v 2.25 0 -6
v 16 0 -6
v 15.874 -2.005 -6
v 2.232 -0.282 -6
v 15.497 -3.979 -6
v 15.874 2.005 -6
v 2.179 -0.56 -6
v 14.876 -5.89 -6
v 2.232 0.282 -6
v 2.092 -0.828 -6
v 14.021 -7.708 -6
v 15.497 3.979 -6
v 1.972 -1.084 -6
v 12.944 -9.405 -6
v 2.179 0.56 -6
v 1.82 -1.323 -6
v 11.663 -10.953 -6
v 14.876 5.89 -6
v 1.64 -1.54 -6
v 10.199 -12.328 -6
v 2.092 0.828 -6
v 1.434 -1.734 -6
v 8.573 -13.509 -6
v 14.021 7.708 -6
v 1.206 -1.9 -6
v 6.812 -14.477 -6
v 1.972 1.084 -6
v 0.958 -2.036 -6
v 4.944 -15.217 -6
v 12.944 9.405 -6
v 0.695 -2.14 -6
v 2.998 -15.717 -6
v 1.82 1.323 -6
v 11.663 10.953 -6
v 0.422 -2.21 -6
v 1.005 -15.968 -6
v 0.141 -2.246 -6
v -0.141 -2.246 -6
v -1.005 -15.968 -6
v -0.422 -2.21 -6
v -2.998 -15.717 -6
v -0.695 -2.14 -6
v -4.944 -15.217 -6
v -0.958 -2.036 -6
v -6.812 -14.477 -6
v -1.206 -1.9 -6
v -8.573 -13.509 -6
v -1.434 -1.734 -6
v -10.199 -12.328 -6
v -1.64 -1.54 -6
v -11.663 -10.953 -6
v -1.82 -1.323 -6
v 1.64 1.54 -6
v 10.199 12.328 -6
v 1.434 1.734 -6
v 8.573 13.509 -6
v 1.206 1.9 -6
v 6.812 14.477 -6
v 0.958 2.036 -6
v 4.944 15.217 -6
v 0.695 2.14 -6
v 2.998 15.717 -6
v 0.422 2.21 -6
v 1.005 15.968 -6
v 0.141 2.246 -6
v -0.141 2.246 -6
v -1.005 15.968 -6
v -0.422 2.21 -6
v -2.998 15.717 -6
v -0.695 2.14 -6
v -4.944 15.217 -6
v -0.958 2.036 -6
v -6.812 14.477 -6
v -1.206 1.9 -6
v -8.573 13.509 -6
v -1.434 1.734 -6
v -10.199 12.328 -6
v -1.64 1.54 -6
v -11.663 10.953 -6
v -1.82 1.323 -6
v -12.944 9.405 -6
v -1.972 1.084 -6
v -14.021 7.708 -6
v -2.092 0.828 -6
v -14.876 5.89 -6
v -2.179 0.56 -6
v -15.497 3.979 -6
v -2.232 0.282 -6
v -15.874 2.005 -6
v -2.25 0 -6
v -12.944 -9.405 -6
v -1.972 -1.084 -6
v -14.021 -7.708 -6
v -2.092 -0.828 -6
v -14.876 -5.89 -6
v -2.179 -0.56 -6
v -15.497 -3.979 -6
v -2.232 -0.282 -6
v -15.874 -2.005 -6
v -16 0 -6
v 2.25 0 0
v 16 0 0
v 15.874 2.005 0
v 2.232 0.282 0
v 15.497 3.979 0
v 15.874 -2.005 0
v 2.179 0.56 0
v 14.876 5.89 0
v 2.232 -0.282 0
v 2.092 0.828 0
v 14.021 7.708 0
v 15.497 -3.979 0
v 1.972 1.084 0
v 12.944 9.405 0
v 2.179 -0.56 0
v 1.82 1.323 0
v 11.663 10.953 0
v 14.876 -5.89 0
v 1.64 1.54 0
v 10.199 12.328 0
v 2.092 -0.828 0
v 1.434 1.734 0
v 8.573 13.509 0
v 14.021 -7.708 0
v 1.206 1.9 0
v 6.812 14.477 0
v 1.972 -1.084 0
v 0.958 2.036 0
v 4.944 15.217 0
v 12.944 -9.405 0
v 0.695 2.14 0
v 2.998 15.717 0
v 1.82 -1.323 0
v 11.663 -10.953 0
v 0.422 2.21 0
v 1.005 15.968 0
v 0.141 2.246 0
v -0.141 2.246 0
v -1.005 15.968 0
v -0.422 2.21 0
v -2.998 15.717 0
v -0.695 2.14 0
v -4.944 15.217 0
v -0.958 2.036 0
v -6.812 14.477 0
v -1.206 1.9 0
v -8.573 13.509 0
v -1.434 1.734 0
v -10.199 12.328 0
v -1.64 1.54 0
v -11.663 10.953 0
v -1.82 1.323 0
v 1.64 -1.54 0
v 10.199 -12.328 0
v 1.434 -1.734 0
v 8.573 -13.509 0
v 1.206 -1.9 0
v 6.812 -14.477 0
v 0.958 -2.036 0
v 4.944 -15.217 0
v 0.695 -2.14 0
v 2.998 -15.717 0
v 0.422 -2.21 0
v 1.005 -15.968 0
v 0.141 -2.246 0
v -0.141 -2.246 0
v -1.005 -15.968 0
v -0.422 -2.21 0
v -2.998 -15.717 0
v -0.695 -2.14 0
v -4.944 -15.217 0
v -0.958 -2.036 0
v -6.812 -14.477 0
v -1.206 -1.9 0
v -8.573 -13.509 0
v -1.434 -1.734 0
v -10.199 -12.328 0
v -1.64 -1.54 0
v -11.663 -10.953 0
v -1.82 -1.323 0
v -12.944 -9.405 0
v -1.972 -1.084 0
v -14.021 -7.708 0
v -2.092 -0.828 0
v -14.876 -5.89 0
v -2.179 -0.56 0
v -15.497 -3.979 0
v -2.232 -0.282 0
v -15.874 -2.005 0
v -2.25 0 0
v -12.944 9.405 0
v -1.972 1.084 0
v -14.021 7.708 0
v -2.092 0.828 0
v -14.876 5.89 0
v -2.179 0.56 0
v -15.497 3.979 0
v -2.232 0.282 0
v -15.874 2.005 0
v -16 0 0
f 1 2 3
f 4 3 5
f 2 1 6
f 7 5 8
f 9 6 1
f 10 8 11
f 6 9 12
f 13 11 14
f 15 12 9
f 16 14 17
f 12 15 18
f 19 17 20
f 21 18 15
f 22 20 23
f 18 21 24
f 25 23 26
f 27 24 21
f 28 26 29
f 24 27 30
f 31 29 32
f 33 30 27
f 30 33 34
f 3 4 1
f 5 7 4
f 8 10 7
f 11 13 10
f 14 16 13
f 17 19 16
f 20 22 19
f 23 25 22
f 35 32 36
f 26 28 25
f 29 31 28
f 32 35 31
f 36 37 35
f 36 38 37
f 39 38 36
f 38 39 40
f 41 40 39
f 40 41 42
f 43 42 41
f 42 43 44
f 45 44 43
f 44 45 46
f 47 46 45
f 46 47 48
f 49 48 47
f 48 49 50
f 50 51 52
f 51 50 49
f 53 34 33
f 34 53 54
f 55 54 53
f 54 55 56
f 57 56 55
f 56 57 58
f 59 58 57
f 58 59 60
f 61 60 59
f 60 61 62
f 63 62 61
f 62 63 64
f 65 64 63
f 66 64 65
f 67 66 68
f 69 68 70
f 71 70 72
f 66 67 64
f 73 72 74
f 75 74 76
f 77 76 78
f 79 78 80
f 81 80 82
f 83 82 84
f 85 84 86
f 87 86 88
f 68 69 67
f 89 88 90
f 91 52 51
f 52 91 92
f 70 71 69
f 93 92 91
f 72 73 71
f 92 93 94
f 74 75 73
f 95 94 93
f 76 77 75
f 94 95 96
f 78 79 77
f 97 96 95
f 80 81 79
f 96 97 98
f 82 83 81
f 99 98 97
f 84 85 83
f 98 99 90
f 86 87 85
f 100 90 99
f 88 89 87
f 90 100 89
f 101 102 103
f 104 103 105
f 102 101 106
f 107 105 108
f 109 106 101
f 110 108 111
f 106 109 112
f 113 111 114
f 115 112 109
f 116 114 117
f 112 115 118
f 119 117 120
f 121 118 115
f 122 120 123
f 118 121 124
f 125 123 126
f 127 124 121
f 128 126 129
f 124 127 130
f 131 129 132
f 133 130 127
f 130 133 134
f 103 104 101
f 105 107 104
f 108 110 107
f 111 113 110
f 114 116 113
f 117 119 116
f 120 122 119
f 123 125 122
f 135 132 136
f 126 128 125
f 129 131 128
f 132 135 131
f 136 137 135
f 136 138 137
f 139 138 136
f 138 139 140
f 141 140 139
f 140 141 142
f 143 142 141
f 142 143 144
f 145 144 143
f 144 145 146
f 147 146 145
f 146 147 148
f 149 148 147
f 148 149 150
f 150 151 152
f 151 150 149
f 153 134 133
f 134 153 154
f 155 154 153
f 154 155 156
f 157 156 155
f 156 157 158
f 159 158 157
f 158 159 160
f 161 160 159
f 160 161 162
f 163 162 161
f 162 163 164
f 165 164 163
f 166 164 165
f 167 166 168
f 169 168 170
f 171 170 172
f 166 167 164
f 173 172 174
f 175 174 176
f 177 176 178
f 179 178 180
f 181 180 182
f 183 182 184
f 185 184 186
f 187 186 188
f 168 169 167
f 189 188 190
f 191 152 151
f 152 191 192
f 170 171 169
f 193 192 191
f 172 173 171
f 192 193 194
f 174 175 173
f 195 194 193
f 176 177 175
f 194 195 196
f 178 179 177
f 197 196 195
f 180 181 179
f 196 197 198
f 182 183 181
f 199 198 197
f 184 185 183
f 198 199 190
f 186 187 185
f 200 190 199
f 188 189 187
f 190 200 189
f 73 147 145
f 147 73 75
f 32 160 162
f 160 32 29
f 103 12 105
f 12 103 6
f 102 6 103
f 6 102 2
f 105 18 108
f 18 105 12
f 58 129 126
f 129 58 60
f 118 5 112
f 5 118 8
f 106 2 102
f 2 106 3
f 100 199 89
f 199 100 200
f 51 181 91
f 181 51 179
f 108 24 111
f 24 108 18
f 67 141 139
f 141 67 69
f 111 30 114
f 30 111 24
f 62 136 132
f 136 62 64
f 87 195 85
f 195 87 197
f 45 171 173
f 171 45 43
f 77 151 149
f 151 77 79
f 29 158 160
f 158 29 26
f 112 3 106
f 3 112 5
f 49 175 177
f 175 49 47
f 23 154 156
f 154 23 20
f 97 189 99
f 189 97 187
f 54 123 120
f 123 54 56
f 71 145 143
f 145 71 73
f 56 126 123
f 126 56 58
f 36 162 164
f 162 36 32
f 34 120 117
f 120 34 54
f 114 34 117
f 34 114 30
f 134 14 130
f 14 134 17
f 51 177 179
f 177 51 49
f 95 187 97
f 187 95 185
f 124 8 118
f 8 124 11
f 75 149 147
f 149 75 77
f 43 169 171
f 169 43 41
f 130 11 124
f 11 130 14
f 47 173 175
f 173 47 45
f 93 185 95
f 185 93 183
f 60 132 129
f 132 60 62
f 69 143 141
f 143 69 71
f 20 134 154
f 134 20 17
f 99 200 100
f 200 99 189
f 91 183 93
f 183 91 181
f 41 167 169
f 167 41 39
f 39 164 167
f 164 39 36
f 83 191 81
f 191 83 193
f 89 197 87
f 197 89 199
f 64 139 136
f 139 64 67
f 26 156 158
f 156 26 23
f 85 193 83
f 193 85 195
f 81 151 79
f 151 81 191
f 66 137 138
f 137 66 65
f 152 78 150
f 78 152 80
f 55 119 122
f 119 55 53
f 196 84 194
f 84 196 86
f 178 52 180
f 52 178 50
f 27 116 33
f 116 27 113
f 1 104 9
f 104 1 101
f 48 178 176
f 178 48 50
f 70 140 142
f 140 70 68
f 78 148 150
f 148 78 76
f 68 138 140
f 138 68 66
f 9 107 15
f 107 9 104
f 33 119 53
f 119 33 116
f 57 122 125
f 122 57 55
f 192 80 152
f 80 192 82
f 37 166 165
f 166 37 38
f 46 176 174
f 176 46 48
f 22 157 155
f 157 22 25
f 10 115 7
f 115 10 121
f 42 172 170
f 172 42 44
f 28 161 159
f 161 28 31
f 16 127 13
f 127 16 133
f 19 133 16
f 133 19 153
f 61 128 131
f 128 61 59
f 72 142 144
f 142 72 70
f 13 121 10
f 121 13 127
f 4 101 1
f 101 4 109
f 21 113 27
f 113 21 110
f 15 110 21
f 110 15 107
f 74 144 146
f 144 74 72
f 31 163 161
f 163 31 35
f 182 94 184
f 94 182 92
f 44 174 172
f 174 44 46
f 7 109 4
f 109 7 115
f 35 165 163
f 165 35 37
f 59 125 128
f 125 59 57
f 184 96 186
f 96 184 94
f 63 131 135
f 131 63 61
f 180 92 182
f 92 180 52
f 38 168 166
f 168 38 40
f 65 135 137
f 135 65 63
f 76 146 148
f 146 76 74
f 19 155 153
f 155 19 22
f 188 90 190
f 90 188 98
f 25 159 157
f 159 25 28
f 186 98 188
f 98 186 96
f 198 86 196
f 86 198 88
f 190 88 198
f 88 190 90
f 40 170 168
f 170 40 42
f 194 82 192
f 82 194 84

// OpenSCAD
$fn = 50;


difference() {
	union() {
		translate(v = [0, 0, -6.0000000000]) {
			cylinder(h = 6, r = 7.0000000000);
		}
		translate(v = [0, 0, -6.0000000000]) {
			cylinder(h = 6, r = 16.0000000000);
		}
	}
	union() {
		#translate(v = [0, 0, -6]) {
			cylinder(h = 6, r = 2.2500000000);
		}
	}
}
